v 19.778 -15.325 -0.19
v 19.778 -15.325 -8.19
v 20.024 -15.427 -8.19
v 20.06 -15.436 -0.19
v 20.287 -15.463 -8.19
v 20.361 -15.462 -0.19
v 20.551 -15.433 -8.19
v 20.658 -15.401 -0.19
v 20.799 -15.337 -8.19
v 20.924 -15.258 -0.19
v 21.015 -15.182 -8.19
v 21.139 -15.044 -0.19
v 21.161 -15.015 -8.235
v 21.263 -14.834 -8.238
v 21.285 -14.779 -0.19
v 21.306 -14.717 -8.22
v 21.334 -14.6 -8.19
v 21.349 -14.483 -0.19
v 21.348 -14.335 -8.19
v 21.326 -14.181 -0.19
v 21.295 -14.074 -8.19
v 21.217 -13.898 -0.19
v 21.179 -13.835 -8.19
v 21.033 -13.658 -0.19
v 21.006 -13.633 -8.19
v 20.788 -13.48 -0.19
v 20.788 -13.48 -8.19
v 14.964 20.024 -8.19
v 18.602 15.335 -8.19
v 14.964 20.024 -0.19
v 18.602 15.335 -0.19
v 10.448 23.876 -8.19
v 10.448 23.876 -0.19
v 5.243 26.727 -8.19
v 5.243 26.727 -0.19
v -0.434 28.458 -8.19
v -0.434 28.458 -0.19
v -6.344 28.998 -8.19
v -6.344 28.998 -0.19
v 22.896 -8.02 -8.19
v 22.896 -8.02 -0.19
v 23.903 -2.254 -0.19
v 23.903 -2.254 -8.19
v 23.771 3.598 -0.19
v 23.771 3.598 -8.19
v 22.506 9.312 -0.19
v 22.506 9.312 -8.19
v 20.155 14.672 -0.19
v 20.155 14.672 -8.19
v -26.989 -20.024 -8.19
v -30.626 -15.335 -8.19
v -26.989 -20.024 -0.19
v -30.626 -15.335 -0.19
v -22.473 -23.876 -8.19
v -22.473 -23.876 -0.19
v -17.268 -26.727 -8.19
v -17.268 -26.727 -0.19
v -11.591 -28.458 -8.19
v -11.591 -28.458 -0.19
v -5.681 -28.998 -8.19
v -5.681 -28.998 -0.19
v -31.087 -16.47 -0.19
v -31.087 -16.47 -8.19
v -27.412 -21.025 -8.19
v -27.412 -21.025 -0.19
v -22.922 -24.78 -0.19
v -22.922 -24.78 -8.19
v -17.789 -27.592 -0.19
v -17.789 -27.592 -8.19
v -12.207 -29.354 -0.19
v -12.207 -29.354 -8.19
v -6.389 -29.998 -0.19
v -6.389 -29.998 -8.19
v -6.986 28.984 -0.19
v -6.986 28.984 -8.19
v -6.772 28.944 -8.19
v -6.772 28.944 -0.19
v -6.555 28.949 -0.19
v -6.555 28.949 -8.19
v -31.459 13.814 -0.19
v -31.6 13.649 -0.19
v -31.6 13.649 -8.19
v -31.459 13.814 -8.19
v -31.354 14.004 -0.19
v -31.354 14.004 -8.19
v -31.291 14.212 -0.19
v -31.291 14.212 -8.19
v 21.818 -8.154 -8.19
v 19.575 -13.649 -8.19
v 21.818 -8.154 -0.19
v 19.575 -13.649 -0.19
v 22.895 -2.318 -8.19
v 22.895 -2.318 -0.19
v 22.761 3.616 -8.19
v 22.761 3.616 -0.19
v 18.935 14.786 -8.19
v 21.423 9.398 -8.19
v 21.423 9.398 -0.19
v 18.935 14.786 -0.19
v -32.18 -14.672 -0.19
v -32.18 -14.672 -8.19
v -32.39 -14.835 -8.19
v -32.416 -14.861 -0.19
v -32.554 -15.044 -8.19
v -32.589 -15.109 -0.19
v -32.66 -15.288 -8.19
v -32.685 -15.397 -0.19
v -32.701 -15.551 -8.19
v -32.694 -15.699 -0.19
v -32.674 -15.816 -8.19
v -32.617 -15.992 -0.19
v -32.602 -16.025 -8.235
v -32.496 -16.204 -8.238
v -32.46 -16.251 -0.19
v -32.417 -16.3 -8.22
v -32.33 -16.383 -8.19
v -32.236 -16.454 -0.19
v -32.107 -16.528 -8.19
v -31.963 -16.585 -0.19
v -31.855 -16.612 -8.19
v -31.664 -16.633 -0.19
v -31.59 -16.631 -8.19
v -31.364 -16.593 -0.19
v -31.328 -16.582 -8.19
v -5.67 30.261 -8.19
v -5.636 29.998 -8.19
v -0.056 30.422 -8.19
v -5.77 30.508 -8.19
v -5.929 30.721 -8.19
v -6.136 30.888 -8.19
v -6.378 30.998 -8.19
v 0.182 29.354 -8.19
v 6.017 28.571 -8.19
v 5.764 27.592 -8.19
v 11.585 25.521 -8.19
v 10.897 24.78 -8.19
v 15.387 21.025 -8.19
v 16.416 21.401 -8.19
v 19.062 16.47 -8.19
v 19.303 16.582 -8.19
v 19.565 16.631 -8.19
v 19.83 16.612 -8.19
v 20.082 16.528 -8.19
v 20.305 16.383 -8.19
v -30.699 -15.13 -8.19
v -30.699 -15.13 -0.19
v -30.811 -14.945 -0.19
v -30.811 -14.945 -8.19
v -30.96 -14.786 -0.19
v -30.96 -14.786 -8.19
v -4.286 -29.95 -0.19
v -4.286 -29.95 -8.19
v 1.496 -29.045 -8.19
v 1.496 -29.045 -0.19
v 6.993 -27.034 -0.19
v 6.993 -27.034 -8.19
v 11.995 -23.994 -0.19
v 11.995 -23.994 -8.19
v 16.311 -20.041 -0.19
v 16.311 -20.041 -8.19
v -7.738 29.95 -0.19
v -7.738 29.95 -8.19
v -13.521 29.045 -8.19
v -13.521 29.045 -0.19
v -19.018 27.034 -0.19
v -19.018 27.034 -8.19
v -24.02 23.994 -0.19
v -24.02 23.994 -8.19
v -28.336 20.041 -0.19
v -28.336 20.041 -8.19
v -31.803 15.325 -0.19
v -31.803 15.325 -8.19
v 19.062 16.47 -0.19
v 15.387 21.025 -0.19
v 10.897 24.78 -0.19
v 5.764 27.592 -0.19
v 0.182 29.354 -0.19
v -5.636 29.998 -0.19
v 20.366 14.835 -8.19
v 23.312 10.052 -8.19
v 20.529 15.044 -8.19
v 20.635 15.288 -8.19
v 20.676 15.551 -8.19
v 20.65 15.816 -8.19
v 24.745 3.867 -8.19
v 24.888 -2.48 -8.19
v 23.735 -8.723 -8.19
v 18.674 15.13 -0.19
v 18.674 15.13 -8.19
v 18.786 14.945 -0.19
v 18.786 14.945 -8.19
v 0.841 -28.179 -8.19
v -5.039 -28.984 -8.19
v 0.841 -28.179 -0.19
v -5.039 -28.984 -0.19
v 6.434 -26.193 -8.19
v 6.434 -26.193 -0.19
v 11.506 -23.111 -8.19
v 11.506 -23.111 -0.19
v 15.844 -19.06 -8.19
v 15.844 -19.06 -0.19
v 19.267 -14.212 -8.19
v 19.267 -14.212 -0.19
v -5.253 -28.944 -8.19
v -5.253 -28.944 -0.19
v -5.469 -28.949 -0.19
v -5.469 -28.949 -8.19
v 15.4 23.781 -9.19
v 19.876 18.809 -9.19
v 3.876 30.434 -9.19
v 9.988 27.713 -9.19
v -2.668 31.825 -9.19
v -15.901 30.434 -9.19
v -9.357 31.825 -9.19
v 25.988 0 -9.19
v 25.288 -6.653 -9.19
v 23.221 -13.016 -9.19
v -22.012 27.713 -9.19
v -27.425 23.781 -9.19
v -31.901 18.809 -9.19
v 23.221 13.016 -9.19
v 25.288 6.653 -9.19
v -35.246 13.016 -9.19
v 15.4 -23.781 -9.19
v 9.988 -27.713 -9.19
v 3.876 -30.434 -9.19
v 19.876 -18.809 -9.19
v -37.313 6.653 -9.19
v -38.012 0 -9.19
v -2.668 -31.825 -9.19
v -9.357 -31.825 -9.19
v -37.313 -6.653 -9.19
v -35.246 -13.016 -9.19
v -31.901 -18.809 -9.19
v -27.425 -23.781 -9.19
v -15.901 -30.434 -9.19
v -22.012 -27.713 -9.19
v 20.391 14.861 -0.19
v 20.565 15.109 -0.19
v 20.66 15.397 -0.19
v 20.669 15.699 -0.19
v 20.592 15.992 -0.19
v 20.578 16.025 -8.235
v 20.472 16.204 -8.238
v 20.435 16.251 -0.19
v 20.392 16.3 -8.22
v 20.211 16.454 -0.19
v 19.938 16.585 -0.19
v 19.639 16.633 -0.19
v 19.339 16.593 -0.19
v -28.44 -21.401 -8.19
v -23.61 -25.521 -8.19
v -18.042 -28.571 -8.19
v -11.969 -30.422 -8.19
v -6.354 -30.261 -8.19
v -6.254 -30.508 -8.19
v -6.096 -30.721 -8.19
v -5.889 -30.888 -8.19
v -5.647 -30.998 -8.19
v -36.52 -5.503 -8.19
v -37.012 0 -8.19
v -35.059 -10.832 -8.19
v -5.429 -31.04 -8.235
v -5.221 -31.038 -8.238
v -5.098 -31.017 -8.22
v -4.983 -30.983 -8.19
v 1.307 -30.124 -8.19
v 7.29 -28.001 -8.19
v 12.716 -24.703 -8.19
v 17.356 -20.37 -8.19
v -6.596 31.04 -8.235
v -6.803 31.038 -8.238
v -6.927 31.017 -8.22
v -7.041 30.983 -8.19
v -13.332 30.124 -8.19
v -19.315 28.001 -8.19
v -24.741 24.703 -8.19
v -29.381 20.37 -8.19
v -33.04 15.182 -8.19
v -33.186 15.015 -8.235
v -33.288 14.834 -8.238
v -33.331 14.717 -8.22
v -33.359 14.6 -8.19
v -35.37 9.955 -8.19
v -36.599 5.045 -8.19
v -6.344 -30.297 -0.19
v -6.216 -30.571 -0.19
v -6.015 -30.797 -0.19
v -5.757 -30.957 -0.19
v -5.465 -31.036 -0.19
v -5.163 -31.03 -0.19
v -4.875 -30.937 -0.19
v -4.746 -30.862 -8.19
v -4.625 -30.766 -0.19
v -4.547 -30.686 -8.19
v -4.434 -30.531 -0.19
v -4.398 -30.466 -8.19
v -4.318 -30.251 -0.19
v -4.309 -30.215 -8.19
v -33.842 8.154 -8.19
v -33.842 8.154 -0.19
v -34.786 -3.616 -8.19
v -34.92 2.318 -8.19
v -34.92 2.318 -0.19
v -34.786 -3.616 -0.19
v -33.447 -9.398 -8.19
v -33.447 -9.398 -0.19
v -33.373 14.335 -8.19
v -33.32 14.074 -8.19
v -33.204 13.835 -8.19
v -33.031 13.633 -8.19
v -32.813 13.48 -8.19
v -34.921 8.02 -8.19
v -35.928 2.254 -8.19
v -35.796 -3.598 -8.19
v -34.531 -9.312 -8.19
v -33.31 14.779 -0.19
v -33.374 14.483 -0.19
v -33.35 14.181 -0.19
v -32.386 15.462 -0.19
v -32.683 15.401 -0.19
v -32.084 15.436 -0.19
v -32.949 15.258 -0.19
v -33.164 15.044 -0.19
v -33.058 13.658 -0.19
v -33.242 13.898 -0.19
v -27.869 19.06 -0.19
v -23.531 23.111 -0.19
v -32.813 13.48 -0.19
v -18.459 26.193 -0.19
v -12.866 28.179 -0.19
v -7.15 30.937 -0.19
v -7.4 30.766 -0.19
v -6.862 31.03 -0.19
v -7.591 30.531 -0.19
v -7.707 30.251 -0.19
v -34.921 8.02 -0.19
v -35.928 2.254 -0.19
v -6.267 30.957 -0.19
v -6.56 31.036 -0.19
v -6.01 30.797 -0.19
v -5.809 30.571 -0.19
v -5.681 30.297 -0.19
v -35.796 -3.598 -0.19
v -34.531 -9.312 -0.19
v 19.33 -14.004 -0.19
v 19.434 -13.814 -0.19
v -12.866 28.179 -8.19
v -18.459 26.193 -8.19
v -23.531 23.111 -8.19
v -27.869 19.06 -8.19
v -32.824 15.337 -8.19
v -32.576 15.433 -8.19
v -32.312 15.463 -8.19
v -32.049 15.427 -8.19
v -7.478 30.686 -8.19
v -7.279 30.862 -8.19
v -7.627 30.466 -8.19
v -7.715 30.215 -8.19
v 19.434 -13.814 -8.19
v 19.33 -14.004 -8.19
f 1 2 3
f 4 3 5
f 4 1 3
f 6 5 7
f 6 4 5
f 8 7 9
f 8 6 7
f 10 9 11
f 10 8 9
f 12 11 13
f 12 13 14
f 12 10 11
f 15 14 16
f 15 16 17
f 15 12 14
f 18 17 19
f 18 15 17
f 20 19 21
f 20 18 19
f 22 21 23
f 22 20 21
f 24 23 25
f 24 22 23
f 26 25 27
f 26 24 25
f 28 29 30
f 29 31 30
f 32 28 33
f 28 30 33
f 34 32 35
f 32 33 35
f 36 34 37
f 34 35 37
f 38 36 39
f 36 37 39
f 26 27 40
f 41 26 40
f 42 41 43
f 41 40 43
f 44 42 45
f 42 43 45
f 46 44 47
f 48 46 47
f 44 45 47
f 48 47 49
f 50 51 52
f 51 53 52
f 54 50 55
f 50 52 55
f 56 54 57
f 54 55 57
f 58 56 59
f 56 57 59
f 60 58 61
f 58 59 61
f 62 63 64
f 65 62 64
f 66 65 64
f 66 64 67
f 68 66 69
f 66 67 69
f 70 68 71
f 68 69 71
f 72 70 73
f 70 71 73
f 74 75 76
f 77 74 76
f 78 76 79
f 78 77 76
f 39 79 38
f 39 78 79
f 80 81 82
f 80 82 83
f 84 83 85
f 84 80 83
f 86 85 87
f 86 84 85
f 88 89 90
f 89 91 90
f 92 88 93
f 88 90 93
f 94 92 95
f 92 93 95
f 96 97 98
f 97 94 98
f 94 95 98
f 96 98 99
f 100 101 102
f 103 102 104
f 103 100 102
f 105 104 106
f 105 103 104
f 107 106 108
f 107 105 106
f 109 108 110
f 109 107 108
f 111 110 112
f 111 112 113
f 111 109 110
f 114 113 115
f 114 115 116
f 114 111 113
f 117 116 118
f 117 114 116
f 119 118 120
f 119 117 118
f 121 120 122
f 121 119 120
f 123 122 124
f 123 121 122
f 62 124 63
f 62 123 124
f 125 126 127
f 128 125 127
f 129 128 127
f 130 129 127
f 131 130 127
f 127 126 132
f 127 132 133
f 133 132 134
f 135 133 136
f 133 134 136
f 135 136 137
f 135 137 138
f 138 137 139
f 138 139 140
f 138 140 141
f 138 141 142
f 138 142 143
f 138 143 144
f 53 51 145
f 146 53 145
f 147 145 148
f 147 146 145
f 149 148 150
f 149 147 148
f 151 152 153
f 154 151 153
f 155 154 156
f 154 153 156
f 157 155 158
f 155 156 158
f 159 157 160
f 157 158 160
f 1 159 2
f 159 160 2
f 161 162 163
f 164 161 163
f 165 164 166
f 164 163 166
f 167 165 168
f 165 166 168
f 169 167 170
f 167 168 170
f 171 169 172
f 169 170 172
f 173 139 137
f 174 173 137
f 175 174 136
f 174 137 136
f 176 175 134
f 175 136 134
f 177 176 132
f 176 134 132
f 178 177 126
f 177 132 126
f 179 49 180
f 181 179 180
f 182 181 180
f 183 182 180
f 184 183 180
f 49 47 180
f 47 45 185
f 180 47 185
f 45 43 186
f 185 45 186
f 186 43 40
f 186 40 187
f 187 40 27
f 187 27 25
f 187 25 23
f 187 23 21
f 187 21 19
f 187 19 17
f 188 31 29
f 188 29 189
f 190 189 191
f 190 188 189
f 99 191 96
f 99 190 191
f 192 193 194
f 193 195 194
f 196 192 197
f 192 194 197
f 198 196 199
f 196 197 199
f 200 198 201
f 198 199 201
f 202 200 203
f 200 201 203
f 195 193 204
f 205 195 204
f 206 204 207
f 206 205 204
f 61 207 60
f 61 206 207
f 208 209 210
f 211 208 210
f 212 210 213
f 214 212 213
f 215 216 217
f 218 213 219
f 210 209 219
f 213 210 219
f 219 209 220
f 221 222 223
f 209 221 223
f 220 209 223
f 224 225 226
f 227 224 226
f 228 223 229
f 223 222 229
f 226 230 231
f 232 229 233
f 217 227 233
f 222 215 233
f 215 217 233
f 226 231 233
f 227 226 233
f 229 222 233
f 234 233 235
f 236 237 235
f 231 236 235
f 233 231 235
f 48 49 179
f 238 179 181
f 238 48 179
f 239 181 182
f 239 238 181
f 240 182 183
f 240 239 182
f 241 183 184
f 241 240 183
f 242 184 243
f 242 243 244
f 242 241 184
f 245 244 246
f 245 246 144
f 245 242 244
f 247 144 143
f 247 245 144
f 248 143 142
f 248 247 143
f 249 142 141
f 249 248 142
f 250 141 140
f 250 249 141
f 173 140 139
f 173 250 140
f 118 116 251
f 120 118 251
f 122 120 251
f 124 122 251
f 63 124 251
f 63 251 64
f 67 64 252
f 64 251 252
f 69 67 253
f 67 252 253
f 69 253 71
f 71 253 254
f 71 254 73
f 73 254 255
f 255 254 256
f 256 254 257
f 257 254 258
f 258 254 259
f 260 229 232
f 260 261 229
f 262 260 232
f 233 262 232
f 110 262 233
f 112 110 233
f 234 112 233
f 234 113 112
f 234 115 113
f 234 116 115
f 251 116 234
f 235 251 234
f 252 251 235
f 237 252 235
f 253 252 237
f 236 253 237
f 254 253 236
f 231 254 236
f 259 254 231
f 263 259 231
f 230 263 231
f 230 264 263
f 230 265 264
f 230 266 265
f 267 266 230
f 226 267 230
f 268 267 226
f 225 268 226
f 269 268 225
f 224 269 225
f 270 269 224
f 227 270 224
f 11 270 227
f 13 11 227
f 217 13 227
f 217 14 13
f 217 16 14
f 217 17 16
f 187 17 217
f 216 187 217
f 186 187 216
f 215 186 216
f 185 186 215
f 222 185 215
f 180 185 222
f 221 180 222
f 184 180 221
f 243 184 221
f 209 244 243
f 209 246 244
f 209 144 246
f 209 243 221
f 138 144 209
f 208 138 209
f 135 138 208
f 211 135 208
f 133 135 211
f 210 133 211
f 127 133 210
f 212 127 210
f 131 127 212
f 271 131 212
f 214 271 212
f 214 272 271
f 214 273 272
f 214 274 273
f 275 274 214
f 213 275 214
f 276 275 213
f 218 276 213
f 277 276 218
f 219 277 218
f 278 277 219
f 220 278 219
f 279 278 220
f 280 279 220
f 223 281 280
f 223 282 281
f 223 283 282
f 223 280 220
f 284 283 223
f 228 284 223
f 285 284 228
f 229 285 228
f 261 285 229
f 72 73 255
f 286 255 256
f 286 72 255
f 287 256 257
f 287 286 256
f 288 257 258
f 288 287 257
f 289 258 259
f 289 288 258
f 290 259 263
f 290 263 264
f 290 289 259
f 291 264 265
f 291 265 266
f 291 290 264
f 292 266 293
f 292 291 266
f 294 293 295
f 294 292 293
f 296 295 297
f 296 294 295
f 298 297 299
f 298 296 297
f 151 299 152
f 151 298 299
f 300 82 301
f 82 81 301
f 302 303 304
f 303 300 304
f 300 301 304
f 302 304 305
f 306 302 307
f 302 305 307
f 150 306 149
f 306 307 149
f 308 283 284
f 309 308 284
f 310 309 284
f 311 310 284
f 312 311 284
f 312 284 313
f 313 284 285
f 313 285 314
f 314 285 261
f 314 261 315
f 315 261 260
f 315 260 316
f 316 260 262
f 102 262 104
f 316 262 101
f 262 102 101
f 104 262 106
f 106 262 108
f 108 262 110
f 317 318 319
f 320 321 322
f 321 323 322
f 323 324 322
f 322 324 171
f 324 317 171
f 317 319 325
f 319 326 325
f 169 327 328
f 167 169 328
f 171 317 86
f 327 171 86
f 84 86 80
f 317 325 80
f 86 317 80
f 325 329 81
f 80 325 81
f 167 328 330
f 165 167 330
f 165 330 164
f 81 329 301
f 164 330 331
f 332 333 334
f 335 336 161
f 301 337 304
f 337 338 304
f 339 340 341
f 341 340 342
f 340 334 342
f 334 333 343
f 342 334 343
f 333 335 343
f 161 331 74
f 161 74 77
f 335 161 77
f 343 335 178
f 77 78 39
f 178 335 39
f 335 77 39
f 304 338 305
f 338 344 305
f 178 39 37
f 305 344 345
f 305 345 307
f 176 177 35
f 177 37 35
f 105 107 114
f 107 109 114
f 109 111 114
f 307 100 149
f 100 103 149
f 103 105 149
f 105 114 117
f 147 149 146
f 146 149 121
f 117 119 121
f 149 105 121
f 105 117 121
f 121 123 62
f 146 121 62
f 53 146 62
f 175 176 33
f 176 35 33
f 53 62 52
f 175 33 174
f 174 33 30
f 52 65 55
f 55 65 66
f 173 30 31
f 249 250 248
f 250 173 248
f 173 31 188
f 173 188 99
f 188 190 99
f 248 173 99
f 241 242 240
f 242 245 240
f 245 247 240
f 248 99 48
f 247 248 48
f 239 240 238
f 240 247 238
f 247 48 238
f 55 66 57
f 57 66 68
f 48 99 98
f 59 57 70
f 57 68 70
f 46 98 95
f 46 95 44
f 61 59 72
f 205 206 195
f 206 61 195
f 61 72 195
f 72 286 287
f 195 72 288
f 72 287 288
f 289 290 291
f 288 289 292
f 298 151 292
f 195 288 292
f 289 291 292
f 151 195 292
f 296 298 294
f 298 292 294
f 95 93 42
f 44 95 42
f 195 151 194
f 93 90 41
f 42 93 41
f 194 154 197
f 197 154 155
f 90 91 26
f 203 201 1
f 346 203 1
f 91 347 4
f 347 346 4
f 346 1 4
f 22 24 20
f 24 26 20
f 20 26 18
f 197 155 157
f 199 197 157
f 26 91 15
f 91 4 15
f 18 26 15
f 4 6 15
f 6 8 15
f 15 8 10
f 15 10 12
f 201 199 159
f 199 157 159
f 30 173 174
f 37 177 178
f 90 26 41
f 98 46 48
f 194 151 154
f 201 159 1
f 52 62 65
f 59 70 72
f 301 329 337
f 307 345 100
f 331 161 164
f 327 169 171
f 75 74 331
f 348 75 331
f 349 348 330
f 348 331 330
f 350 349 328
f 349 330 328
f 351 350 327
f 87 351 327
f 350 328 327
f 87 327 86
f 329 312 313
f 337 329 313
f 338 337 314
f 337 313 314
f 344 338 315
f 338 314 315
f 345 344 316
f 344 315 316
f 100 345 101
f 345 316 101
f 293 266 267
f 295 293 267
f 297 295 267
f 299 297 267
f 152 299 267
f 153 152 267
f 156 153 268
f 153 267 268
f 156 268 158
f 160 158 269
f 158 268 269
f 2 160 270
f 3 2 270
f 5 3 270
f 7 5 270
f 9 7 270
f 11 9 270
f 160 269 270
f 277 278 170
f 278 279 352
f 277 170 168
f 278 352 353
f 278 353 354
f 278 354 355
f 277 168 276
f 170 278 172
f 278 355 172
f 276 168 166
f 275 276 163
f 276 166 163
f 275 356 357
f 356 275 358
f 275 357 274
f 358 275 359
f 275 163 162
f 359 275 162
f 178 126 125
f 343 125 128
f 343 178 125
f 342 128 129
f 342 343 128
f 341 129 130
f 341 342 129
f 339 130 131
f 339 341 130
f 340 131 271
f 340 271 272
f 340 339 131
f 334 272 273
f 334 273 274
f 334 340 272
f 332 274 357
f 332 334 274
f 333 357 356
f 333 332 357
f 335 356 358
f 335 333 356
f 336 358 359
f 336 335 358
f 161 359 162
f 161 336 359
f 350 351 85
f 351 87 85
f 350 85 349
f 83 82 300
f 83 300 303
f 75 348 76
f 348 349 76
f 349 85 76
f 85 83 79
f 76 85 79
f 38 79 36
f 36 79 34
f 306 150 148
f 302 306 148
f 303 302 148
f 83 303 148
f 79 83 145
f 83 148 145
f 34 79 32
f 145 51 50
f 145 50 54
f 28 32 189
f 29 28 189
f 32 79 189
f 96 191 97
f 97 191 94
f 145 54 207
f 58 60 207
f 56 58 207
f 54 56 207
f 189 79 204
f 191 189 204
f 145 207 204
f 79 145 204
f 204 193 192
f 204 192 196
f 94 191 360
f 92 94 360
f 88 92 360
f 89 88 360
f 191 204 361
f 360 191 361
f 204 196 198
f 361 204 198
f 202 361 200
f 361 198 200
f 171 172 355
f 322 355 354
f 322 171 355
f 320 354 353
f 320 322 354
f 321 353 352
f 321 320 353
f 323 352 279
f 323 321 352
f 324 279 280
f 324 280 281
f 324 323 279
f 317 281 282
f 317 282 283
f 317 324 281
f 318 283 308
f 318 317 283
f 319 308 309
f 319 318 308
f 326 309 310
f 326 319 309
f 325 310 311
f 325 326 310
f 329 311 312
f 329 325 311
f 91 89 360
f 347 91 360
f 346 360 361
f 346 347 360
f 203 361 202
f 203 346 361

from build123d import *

# Parameters (mm, degrees)
SKETCH_2_R               = 1.051872146
EXTRUDE_1_DEPTH          = 8
PATTERN_CIRCULAR_1_COUNT = 6
CHAMFER_1_SIZE           = 2


with BuildPart() as part:
    # Эскиз1 → Повернуть1 (revolve)
    with BuildSketch(Plane(origin=(0, 0, 0), x_dir=(1, 0, 0), z_dir=(0, 1, 0))):
        Polygon((-39.012426389, 8.189631494), (-39.012426389, 9.189631494), (-6.012426389, 9.189631494), (-6.012426389, 8.189631494), (-35.012426389, 8.189631494), (-35.012426389, 0.189631494), (-36.012426389, 0.189631494), (-36.012426389, 8.189631494), align=None)
    revolve(axis=Axis((-6.012426389, 0, -9.189631494), (0, 0, 1)))

    # Эскиз2 → Бобышка-Вытянуть1 (add)
    with BuildSketch(Plane.XY.offset(-0.189631494)):
        with Locations((-6.68742643, 29.992405288)):
            Circle(SKETCH_2_R)
    extrude_1 = extrude(amount=-EXTRUDE_1_DEPTH)

    # Круговой массив1: Бобышка-Вытянуть1 ×6 about axis
    pattern_circular_1_axis = Axis((-6.012426389, 0, 0), (0, 0, 1))
    for i in range(1, PATTERN_CIRCULAR_1_COUNT):
        add(extrude_1.rotate(pattern_circular_1_axis, i * 360 / PATTERN_CIRCULAR_1_COUNT))

    # Фаска1
    # the kernel refuses this chamfer: 2 mm, written as the material it takes off along each edge
    with BuildSketch(Plane(origin=(-6.012426389, 0, -8.189631494), x_dir=(-1, 0, 0), z_dir=(0, 1, 0))) as chamfer_1_piece_1_section:
        Polygon((33, -CHAMFER_1_SIZE), (33 - CHAMFER_1_SIZE, 0), (33, 0), align=None)
    chamfer_1_piece_1 = revolve(axis=Axis((-6.012426389, 0, -8.189631494), (0, 0, 1)), mode=Mode.PRIVATE)
    chamfer_1_piece_1 = chamfer_1_piece_1 - Plane(origin=(19.62425849, 15.580769827, -9.135558261), x_dir=(0.5000000000000001, -0.8660254037844386, 0), z_dir=(0, 0, 1)) * Cylinder(1.051872146, 132, mode=Mode.PRIVATE)
    chamfer_1_piece_1 = chamfer_1_piece_1 - Plane(origin=(20.299258531, -14.411635461, -9.135558261), x_dir=(-0.5000000000000004, -0.8660254037844384, 0), z_dir=(0, 0, 1)) * Cylinder(1.051872146, 132, mode=Mode.PRIVATE)
    chamfer_1_piece_1 = chamfer_1_piece_1 - Plane(origin=(-5.337426348, -29.992405288, -9.135558261), x_dir=(-1, 0, 0), z_dir=(0, 0, 1)) * Cylinder(1.051872146, 132, mode=Mode.PRIVATE)
    chamfer_1_piece_1 = chamfer_1_piece_1 - Plane(origin=(-31.649111268, -15.580769827, -9.135558261), x_dir=(-0.49999999999999983, 0.8660254037844388, 0), z_dir=(0, 0, 1)) * Cylinder(1.051872146, 132, mode=Mode.PRIVATE)
    chamfer_1_piece_1 = chamfer_1_piece_1 - Plane(origin=(-32.324111309, 14.411635461, -9.135558261), x_dir=(0.5000000000000001, 0.8660254037844386, 0), z_dir=(0, 0, 1)) * Cylinder(1.051872146, 132, mode=Mode.PRIVATE)
    chamfer_1_piece_1 = chamfer_1_piece_1 - Plane(origin=(-6.68742643, 29.992405288, -9.135558261), x_dir=(1, 0, 0), z_dir=(0, 0, 1)) * Cylinder(1.051872146, 132, mode=Mode.PRIVATE)
    add(chamfer_1_piece_1, mode=Mode.SUBTRACT)


solid = part.part
